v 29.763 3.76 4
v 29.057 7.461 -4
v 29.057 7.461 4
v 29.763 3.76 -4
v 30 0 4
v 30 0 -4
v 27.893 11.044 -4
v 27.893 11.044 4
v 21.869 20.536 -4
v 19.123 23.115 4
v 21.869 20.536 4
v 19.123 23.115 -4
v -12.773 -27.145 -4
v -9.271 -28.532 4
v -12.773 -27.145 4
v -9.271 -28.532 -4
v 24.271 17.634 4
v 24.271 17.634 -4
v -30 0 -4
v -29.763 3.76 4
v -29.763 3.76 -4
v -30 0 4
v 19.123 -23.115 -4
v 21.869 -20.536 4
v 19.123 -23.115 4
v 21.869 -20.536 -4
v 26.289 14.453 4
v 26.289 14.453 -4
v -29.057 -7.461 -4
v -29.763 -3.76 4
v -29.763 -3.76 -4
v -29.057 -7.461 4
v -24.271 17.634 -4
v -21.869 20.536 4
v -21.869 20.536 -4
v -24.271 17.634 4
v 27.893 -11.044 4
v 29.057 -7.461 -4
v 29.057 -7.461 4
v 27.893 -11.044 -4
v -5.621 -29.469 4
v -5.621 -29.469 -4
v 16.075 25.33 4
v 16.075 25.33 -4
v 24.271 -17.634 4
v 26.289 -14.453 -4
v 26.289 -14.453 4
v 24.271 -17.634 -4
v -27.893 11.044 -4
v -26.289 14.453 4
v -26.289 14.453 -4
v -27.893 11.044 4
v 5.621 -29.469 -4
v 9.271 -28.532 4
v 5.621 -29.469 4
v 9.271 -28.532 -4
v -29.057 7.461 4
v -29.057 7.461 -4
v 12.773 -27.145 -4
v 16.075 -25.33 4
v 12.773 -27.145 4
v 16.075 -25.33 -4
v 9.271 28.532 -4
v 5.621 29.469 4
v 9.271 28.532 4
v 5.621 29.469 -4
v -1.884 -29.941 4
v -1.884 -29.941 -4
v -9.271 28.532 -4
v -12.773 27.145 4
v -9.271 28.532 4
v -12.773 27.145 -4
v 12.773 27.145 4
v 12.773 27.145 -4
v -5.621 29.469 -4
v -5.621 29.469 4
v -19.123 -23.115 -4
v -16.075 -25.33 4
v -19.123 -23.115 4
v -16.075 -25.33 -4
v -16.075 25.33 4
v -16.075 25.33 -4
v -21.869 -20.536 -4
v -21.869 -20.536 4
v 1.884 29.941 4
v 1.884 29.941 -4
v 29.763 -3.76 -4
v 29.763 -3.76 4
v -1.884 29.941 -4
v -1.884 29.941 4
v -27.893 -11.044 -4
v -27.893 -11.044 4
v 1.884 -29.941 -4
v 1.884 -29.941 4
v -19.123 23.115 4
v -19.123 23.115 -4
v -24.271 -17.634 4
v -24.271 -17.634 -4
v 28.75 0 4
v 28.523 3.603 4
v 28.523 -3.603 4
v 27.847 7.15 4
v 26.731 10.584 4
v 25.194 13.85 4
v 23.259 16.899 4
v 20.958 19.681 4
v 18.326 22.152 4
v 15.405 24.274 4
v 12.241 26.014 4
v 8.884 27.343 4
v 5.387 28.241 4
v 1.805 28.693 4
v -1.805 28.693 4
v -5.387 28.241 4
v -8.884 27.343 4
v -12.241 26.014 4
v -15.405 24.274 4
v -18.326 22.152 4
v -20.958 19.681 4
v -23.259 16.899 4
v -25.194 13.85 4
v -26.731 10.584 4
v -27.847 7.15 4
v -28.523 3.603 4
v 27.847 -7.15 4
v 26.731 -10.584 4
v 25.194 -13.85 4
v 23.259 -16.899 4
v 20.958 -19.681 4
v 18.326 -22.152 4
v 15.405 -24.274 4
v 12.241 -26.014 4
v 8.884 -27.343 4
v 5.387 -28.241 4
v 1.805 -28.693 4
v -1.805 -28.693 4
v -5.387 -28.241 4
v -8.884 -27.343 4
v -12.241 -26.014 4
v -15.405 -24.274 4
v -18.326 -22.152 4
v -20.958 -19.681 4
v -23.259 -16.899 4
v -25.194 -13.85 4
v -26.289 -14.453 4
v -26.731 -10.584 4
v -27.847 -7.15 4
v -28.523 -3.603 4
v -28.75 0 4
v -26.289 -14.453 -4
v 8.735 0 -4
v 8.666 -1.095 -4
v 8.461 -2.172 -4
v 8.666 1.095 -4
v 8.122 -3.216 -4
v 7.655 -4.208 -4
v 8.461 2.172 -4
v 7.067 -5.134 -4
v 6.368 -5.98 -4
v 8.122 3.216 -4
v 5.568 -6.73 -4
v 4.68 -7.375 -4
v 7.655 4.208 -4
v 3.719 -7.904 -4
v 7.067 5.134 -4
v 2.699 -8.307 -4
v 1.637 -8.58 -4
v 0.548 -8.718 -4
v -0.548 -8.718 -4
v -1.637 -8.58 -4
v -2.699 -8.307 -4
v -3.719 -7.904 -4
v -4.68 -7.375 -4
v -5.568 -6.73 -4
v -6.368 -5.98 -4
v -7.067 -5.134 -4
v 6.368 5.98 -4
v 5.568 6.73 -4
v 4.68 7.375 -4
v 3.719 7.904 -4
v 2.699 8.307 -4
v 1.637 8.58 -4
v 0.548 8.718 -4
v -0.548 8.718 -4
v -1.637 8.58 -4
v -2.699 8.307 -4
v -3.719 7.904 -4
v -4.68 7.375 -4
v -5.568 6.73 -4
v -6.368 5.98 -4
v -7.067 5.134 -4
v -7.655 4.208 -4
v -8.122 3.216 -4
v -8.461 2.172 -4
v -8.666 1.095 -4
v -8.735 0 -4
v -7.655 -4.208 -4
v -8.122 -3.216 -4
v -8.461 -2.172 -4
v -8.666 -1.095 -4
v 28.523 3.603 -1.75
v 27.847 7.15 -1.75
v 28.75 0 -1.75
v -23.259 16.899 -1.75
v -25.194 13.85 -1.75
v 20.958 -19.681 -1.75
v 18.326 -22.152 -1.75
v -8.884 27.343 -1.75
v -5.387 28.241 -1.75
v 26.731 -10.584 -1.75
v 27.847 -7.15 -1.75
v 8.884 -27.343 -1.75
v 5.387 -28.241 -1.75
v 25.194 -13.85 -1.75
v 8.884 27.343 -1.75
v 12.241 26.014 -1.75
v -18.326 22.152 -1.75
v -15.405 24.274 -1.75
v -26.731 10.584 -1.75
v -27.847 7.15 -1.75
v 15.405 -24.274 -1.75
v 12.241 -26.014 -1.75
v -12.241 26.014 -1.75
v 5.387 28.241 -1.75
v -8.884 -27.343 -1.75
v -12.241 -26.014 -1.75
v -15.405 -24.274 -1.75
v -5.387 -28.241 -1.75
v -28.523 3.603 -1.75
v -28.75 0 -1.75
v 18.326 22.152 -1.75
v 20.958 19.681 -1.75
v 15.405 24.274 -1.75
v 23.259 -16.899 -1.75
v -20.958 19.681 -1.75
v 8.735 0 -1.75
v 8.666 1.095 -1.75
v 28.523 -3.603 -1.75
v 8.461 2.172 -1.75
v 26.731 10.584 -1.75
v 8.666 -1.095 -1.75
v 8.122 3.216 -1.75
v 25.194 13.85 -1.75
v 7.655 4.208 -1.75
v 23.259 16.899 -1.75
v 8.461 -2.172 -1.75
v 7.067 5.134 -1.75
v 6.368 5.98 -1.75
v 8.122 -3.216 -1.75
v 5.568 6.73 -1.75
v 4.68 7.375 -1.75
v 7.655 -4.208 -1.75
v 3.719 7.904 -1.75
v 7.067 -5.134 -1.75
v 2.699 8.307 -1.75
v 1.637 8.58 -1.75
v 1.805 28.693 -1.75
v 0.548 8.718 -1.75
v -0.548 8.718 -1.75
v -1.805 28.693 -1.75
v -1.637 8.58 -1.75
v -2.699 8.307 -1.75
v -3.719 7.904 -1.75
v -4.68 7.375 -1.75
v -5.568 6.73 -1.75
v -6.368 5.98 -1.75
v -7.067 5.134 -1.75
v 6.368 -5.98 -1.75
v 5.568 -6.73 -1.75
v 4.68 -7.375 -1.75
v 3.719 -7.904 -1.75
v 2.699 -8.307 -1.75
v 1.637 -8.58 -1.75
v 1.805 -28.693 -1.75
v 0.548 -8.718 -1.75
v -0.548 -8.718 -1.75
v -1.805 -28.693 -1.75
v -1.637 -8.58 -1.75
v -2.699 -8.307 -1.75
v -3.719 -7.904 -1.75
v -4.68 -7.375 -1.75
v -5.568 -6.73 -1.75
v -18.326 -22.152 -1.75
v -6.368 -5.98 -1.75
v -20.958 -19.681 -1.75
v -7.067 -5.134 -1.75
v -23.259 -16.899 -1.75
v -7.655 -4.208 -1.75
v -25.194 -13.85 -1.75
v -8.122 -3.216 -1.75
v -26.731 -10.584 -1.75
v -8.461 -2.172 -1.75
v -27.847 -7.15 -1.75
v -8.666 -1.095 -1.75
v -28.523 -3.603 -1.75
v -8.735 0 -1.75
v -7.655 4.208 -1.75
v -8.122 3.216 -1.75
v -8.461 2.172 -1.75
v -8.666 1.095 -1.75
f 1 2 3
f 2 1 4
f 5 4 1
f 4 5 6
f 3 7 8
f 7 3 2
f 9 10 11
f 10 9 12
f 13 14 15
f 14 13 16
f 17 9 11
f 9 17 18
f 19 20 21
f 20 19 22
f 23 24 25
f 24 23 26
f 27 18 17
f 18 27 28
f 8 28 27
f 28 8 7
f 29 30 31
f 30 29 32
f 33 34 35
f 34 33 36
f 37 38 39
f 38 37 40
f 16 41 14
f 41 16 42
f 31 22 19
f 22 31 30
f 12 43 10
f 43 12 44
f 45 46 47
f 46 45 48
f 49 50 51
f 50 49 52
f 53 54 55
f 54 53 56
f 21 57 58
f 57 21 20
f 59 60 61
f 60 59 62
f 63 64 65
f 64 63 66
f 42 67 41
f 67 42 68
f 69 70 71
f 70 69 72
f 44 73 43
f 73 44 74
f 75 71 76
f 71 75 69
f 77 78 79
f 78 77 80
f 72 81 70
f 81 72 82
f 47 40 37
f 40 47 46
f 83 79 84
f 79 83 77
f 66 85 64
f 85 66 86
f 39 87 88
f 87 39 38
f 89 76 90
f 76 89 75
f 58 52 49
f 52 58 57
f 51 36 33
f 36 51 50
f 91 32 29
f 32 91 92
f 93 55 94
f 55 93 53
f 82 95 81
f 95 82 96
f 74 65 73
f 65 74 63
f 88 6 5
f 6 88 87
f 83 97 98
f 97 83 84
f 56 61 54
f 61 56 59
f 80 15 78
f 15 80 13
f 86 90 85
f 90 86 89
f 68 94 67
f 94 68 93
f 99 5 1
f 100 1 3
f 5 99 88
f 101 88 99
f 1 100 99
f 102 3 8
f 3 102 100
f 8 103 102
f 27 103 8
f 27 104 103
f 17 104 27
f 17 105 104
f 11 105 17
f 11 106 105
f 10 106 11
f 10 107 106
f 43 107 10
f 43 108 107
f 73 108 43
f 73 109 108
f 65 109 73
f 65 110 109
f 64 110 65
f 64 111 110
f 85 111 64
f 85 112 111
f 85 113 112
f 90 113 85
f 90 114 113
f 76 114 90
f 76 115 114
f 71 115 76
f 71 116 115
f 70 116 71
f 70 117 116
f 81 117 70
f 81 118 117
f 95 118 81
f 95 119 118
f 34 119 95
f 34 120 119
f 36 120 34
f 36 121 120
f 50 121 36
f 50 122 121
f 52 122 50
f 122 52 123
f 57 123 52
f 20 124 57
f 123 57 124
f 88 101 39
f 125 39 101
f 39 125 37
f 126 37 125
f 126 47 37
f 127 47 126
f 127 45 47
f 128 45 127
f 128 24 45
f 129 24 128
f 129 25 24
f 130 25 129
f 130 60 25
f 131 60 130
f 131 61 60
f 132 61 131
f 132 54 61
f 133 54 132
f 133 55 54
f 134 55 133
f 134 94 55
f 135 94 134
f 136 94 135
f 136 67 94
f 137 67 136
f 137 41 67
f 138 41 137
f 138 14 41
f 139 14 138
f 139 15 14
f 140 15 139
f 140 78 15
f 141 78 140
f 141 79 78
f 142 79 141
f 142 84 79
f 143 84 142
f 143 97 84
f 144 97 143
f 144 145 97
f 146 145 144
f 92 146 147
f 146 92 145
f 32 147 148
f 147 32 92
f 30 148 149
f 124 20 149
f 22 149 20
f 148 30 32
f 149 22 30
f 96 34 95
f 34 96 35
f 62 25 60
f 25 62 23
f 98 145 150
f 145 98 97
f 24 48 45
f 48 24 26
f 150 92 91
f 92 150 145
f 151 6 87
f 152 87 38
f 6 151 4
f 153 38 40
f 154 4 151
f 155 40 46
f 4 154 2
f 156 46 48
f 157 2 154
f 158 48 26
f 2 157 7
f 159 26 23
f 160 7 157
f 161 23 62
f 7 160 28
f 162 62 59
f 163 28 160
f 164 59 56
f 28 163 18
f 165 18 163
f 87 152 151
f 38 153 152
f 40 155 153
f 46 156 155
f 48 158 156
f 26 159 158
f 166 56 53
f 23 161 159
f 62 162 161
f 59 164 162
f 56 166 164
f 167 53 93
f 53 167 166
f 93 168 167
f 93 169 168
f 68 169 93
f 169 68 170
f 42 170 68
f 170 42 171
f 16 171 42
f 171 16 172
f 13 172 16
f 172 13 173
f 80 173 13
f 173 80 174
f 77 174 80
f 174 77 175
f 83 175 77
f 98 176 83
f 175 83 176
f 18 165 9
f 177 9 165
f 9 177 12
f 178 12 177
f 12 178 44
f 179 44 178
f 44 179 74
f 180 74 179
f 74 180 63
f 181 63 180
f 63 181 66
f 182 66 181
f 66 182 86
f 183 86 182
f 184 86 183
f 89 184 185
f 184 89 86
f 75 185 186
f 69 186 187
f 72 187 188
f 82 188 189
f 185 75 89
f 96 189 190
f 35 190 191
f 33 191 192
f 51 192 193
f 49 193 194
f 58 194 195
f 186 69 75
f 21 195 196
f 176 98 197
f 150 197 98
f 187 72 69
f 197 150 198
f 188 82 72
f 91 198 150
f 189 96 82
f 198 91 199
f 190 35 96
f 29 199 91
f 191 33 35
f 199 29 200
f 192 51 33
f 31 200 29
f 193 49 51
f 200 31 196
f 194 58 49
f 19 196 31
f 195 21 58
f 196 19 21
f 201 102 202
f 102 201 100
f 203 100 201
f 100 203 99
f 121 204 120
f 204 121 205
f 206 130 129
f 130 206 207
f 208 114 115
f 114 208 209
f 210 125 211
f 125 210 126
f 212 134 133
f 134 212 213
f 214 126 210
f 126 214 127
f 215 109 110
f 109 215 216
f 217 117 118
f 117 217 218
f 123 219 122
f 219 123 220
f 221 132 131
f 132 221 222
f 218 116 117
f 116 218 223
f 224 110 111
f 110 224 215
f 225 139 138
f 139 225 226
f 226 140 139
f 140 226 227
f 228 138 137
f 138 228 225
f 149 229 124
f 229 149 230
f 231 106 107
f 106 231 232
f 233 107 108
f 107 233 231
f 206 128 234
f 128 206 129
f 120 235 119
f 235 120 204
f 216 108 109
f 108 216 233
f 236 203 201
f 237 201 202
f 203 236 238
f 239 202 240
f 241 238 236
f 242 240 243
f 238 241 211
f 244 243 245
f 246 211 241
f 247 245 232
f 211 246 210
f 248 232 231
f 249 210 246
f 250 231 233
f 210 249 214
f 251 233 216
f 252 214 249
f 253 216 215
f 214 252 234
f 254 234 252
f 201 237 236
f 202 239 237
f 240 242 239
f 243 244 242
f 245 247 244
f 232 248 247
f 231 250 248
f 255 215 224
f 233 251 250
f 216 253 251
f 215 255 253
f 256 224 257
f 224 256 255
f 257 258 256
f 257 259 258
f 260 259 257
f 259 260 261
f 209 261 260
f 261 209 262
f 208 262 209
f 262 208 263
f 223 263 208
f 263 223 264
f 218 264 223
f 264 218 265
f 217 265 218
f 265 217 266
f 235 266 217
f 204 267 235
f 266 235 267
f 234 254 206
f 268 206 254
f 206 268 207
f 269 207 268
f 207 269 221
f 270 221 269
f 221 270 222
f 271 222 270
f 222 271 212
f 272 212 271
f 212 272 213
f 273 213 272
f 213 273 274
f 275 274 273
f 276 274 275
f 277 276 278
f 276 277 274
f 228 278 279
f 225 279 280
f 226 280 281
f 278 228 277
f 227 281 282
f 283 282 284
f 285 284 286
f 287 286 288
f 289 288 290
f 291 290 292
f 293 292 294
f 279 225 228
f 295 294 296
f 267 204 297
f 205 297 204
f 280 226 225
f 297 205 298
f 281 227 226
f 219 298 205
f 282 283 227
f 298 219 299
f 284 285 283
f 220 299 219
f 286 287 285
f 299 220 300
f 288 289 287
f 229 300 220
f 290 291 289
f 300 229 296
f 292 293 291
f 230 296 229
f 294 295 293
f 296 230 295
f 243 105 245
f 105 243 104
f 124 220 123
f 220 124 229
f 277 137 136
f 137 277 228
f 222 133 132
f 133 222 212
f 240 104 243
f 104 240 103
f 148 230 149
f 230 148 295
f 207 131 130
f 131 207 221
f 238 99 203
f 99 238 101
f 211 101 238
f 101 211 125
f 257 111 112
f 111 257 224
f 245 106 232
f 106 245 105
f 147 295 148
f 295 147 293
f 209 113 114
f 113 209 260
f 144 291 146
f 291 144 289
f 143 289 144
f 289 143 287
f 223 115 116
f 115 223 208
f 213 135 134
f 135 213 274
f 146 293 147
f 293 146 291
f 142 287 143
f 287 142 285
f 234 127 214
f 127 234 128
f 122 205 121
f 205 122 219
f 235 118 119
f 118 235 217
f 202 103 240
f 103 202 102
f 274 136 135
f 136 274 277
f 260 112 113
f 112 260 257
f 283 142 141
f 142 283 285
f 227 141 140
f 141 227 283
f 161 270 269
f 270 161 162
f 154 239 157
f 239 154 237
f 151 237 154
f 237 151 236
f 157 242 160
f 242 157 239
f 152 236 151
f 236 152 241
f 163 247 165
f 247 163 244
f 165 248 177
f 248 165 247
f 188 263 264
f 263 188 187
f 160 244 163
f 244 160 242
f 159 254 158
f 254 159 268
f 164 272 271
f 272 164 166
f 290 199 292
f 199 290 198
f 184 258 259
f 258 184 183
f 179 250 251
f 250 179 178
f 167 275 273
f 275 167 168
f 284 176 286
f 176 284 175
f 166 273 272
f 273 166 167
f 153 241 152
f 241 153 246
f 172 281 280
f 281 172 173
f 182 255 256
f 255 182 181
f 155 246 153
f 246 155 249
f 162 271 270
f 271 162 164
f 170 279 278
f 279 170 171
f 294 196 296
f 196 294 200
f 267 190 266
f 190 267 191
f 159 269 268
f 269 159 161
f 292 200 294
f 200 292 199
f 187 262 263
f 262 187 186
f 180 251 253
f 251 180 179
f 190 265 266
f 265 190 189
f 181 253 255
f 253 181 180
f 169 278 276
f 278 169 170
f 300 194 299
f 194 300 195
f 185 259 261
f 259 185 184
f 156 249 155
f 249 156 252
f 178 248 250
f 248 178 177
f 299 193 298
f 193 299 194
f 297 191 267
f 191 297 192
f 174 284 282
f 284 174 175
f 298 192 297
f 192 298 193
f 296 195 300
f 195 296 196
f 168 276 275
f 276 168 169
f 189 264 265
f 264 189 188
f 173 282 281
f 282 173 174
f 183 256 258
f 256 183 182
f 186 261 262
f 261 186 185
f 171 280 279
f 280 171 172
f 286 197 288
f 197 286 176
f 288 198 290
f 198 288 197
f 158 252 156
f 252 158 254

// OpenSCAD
// This is a powder spill tray.
//
// Warning -- some sanding and fitting may be required.
//
// This is licensed under the creative commons+attribution license
//
// To fulfil the attribution requirement, please link to:
// http://www.thingiverse.com/thing:2207724

/* [Main] */

// Define number of facets (large numbers provide better smoothing)
$fn=50;

// Define height of the cylinder wall in mm
height=8.0;

// Define outside diameter of cylinder in mm
outside_diameter=60.0;

// Define wall thickness in mm
thickness=2.5;

// Define diameter of hole in mm
hole_diameter=17.47;

difference()
{
	// Make outer shape
	translate([0,0,0])              cylinder(h=height,r=outside_diameter/2,center=true);
	// Make inner shape
	translate([0,0,thickness/2]) cylinder(h=height-thickness+.5,r=(outside_diameter-thickness)/2,center=true);
	// Drill hole
	translate([0,0,thickness])    cylinder(h=2*height,r=hole_diameter/2,center=true);
}
